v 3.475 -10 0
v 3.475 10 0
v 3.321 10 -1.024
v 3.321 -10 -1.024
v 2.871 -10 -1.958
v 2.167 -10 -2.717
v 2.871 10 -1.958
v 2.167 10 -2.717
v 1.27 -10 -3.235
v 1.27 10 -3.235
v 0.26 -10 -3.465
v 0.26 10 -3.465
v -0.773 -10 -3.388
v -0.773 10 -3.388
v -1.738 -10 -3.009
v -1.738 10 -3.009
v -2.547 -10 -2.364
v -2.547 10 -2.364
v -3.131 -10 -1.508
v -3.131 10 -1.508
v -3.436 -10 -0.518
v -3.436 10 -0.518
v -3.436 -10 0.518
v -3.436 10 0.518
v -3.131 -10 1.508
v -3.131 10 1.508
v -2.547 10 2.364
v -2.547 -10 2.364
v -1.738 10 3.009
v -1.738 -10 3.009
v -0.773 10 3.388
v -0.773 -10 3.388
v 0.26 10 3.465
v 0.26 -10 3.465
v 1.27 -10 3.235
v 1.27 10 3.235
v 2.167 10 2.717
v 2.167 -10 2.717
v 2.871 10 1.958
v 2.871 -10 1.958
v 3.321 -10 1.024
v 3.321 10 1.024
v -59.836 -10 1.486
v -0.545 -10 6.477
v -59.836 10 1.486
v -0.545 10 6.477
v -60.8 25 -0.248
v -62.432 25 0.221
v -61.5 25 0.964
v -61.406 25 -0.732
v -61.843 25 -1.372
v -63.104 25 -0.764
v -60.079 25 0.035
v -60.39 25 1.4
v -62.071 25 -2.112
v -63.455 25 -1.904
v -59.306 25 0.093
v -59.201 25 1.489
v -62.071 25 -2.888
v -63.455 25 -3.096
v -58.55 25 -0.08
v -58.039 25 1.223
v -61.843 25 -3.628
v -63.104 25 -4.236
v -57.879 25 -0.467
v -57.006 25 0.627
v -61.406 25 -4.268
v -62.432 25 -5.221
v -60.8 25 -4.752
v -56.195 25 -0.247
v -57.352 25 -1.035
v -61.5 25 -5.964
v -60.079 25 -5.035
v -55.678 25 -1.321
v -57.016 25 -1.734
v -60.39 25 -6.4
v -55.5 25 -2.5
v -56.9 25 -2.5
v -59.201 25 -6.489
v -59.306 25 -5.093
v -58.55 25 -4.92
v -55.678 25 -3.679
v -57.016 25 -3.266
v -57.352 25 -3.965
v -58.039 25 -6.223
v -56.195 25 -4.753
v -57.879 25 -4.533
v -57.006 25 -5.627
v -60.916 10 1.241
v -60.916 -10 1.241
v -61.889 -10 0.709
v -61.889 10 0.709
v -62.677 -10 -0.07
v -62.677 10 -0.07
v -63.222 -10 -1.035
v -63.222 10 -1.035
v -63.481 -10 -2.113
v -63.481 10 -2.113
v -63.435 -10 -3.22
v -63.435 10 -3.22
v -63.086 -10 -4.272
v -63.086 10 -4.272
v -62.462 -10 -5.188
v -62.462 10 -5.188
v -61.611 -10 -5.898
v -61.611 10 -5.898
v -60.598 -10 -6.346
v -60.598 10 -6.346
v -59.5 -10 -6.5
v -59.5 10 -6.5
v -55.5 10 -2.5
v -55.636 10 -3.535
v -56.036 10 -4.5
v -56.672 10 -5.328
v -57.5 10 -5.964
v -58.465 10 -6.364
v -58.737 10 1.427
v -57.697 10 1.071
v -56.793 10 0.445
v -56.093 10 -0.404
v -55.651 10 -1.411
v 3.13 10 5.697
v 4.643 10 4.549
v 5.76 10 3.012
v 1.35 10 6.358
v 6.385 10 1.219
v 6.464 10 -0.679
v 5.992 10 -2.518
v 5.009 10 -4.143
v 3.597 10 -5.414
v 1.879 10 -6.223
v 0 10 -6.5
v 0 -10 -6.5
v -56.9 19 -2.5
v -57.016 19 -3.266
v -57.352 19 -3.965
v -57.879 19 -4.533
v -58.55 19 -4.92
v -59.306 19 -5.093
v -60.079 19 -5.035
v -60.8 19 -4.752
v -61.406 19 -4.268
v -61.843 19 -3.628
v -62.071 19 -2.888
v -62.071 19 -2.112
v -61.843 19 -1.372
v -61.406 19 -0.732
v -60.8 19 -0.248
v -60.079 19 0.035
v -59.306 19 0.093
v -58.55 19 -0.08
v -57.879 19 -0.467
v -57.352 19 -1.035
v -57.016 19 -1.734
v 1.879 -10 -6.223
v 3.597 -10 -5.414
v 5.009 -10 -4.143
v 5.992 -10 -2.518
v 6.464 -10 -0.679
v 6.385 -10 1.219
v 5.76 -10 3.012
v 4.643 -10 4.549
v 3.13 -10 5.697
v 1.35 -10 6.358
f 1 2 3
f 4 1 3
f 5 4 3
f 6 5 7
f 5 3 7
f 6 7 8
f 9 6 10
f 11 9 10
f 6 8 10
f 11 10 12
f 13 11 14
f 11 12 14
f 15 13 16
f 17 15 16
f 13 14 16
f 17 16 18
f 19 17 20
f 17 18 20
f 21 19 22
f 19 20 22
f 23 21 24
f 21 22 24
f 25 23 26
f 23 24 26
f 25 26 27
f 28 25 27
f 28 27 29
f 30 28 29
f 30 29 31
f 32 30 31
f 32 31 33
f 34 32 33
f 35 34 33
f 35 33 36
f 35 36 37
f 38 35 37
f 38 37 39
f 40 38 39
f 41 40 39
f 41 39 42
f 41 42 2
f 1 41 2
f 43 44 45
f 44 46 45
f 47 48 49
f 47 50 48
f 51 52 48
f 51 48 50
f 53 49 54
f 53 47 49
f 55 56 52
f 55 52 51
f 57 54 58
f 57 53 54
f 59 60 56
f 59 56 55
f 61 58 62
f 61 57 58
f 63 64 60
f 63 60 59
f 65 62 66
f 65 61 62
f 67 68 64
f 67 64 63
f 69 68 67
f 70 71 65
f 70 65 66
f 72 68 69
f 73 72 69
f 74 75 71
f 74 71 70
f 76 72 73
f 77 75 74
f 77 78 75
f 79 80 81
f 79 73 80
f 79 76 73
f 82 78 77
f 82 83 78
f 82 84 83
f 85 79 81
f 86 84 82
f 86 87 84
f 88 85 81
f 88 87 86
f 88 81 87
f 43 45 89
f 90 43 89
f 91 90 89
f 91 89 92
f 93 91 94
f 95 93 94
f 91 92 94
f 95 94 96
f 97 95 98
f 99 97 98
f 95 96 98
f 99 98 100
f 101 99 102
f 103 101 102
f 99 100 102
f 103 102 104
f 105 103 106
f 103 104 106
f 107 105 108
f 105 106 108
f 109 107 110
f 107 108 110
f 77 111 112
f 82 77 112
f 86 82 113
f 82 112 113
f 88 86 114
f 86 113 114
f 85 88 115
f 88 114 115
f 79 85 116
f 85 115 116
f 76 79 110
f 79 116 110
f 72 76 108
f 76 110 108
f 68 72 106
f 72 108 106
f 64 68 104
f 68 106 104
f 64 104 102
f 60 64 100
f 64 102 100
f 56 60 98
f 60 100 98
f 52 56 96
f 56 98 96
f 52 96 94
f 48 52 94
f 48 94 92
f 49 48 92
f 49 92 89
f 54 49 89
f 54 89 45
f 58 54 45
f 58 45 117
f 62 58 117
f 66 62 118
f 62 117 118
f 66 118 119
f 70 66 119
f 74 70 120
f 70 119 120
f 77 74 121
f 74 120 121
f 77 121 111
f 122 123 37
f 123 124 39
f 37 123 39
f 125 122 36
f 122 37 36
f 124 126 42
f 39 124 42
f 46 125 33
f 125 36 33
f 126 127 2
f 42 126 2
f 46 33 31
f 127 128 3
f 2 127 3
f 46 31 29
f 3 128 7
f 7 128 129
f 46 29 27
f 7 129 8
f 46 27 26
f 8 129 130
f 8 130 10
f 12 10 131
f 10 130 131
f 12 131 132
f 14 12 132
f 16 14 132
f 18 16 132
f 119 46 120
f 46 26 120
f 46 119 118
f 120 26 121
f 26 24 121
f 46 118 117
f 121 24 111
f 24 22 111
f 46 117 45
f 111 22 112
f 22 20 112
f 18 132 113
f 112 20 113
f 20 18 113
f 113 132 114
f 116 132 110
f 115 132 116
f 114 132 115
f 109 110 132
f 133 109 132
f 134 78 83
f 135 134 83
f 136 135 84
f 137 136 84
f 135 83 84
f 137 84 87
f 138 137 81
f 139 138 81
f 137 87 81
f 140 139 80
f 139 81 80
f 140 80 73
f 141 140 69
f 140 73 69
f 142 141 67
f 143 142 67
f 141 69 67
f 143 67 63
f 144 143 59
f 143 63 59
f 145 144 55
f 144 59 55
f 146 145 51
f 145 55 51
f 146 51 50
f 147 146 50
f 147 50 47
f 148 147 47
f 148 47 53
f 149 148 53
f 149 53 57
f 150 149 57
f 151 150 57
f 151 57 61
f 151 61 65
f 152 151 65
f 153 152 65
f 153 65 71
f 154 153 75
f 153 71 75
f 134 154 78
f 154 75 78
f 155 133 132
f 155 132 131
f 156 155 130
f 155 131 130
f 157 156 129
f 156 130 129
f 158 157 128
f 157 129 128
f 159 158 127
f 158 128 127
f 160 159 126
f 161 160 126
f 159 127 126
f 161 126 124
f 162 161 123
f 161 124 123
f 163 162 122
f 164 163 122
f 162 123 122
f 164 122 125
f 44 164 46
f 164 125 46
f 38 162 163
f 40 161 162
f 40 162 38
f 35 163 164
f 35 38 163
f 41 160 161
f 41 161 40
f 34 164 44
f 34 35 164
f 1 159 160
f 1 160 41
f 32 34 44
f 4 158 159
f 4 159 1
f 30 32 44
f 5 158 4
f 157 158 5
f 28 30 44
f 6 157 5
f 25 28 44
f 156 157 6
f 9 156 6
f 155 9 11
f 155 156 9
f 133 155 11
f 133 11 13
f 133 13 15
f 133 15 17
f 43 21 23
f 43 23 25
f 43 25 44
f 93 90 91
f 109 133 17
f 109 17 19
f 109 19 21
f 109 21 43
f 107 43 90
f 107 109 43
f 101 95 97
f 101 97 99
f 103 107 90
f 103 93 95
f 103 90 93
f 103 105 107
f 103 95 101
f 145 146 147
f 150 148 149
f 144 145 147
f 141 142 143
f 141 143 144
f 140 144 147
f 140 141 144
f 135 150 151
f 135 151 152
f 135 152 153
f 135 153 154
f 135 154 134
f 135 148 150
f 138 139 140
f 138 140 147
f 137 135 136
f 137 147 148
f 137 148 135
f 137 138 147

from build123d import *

# Parameters (mm, degrees)
SALIENTE_EXTRUIR1_DEPTH = 10
CROQUIS2_R              = 3.475
CORTAR_EXTRUIR1_DEPTH   = 21
CROQUIS3_R              = 4
SALIENTE_EXTRUIR2_DEPTH = 15
CROQUIS4_R              = 2.6
CORTAR_EXTRUIR2_DEPTH   = 6


with BuildPart() as part:
    # Croquis1 → Saliente-Extruir1 (new body, symmetric)
    with BuildSketch(Plane(origin=(0, 0, 0), x_dir=(1, 0, 0), z_dir=(0, 1, 0))):
        with BuildLine():
            Line((-59.5, 6.5), (0, 6.5))
            ThreePointArc((0, 6.5), (6.494269997, -0.272868487), (-0.545255886, -6.477090089))
            Line((-0.545255886, -6.477090089), (-59.835542084, -1.485901593))
            ThreePointArc((-59.835542084, -1.485901593), (-63.496473844, 2.667919069), (-59.5, 6.5))
        make_face()
    extrude(amount=SALIENTE_EXTRUIR1_DEPTH, both=True)

    # Croquis2 → Cortar-Extruir1 (cut, through all)
    with BuildSketch(Plane(origin=(0, 10, 0), x_dir=(1, 0, 0), z_dir=(0, 1, 0))):
        Circle(CROQUIS2_R)
    extrude(amount=-CORTAR_EXTRUIR1_DEPTH, mode=Mode.SUBTRACT)

    # Croquis3 → Saliente-Extruir2 (add)
    with BuildSketch(Plane(origin=(0, 10, 0), x_dir=(1, 0, 0), z_dir=(0, 1, 0))):
        with Locations((-59.5, 2.5)):
            Circle(CROQUIS3_R)
    extrude(amount=SALIENTE_EXTRUIR2_DEPTH)

    # Croquis4 → Cortar-Extruir2 (cut)
    with BuildSketch(Plane(origin=(0, 25, 0), x_dir=(1, 0, 0), z_dir=(0, 1, 0))):
        with Locations((-59.5, 2.5)):
            Circle(CROQUIS4_R)
    extrude(amount=-CORTAR_EXTRUIR2_DEPTH, mode=Mode.SUBTRACT)


solid = part.part
